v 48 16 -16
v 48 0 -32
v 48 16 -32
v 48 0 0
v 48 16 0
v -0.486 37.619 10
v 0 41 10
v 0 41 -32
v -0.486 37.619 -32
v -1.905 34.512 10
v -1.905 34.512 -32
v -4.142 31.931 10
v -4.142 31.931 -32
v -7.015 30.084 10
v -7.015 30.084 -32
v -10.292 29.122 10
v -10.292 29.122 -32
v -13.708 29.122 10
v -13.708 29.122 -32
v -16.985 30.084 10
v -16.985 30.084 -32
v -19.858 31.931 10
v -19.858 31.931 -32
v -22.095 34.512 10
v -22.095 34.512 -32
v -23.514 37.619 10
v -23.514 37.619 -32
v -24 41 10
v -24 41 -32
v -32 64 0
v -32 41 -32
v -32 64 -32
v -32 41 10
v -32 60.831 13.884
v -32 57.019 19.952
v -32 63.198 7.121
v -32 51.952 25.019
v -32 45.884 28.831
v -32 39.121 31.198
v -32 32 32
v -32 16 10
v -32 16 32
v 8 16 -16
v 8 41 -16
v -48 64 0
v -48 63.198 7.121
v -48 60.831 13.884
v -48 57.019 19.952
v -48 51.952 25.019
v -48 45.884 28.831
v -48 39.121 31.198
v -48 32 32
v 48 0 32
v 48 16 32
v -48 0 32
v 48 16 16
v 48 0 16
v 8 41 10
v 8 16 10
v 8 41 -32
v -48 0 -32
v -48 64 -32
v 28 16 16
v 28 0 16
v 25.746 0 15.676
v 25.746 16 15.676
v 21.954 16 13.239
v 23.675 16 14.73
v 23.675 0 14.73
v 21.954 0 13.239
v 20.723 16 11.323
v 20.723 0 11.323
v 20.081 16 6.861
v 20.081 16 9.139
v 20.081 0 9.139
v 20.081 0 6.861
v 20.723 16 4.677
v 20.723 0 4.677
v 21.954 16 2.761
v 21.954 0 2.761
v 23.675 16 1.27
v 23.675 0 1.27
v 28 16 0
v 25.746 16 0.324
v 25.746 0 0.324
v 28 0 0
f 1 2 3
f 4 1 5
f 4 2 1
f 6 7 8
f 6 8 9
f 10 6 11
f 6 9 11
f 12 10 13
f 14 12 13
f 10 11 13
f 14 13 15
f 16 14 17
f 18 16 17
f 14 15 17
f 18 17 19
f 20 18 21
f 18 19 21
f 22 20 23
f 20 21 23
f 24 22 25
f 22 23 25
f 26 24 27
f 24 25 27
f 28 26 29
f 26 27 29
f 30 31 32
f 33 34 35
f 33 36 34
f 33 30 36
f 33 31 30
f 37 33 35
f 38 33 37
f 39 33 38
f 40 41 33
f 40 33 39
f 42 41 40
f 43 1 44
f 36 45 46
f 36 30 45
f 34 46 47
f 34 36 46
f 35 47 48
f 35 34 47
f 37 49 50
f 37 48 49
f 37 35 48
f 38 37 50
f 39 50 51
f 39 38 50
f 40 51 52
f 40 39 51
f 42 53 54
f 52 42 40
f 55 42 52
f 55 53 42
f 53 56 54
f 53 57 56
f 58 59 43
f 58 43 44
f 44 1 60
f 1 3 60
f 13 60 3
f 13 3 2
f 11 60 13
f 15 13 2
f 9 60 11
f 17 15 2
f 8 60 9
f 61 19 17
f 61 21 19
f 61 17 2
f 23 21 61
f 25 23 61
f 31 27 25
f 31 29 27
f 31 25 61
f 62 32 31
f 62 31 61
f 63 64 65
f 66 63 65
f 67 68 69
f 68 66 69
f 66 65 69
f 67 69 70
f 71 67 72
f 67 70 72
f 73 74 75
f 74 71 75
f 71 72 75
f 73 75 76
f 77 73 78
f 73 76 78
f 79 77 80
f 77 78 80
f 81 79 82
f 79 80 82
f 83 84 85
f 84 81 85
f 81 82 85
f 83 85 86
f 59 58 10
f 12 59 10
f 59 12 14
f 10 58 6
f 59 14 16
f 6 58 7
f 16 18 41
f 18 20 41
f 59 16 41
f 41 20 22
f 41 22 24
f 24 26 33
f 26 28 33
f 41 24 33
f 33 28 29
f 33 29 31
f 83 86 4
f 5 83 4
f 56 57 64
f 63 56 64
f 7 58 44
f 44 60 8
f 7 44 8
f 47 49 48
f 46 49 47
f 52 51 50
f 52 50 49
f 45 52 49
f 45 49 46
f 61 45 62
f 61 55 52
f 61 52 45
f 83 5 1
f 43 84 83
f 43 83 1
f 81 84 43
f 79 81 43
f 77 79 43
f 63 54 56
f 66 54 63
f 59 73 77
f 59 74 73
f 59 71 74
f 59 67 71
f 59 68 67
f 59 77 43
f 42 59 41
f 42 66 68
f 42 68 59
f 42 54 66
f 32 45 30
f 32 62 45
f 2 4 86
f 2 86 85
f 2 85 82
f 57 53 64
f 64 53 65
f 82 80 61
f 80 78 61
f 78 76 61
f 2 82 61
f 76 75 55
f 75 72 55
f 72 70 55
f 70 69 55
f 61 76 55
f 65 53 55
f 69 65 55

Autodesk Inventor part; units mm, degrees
ref_plane "YZ Plane" through (0, 0, 0) normal (1, 0, 0) x (0, 1, 0)
ref_plane "XZ Plane" through (0, 0, 0) normal (0, 1, 0) x (-1, 0, 0)
ref_plane "XY Plane" through (0, 0, 0) normal (0, 0, 1) x (1, 0, 0)
sketch "Sketch1" plane through (0, 0, 0) normal (0, 1, 0) x (-1, 0, 0)
  line L0 (-48, 32) -> (48, 32)
  line L1 (48, 32) -> (48, -32)
  line L2 (48, -32) -> (-48, -32)
  line L3 (-48, -32) -> (-48, 32)
  line L4 (-48, 32) -> (48, -32) construction
  line L5 (48, 32) -> (-48, -32) construction
  line L6 (-48, 16) -> (-28, 16)
  line L7 (-28, 0) -> (-48, 0)
  arc A0 (-28, 0) -> (-28, 16) centre (-28, 8) ccw
  point P0 (0, 0)
  point P1 (-38, 0)
  dimension "d0" = 96
  dimension "d1" = 64
  dimension "d3" = 16
  dimension "d4" = 16
extrude "Extrusion1" add sketch "Sketch1" along normal blind 16 contours L0 L1 L2 L3 L7 A0 L6
sketch "Sketch2" plane through (0, 16, 0) normal (0, 1, 0) x (1, 0, 0)
  line L0 (-48, 32) -> (-48, -32) projected
  line L1 (-48, -32) -> (48, -32) projected
  line L2 (-48, 32) -> (-32, 32)
  line L3 (-32, 32) -> (-32, -32)
  line L4 (-32, -32) -> (-48, -32)
  line L5 (-48, -32) -> (-48, 32)
  point P0 (0, 0)
  dimension "d8" = 16
extrude "Extrusion2" add sketch "Sketch2" along normal blind 48
fillet "Fillet1" radius 32 1 edges at (-40, 64, 32)
sketch "Sketch3" plane through (48, 0, -32) normal (0, 0, -1) x (-1, 0, 0)
  line L0 (80, 16) -> (0, 16) projected
  line L1 (80, 16) -> (40, 16)
  line L2 (40, 16) -> (40, 41)
  line L3 (80, 41) -> (80, 16)
  arc A0 (48, 41) -> (72, 41) centre (60, 41) ccw
  line L4 (40, 41) -> (48, 41)
  line L5 (72, 41) -> (80, 41)
  point P0 (48, 0)
  dimension "d12" = 40
  dimension "d13" = 25
extrude "Extrusion3" add sketch "Sketch3" against normal blind 42
sketch "Sketch4" plane through (48, 0, -32) normal (0, 0, -1) x (-1, 0, 0)
  line L0 (80, 16) -> (0, 16) projected
  line L1 (40, 41) -> (48, 41) projected
  line L2 (0, 16) -> (40, 41)
  line L3 (40, 16) -> (80, 16) projected
  line L4 (40, 41) -> (40, 16)
  line L5 (40, 16) -> (0, 16)
  point P0 (48, 0)
extrude "Extrusion4" add sketch "Sketch4" against normal blind 16
properties part number "desenho 1"
